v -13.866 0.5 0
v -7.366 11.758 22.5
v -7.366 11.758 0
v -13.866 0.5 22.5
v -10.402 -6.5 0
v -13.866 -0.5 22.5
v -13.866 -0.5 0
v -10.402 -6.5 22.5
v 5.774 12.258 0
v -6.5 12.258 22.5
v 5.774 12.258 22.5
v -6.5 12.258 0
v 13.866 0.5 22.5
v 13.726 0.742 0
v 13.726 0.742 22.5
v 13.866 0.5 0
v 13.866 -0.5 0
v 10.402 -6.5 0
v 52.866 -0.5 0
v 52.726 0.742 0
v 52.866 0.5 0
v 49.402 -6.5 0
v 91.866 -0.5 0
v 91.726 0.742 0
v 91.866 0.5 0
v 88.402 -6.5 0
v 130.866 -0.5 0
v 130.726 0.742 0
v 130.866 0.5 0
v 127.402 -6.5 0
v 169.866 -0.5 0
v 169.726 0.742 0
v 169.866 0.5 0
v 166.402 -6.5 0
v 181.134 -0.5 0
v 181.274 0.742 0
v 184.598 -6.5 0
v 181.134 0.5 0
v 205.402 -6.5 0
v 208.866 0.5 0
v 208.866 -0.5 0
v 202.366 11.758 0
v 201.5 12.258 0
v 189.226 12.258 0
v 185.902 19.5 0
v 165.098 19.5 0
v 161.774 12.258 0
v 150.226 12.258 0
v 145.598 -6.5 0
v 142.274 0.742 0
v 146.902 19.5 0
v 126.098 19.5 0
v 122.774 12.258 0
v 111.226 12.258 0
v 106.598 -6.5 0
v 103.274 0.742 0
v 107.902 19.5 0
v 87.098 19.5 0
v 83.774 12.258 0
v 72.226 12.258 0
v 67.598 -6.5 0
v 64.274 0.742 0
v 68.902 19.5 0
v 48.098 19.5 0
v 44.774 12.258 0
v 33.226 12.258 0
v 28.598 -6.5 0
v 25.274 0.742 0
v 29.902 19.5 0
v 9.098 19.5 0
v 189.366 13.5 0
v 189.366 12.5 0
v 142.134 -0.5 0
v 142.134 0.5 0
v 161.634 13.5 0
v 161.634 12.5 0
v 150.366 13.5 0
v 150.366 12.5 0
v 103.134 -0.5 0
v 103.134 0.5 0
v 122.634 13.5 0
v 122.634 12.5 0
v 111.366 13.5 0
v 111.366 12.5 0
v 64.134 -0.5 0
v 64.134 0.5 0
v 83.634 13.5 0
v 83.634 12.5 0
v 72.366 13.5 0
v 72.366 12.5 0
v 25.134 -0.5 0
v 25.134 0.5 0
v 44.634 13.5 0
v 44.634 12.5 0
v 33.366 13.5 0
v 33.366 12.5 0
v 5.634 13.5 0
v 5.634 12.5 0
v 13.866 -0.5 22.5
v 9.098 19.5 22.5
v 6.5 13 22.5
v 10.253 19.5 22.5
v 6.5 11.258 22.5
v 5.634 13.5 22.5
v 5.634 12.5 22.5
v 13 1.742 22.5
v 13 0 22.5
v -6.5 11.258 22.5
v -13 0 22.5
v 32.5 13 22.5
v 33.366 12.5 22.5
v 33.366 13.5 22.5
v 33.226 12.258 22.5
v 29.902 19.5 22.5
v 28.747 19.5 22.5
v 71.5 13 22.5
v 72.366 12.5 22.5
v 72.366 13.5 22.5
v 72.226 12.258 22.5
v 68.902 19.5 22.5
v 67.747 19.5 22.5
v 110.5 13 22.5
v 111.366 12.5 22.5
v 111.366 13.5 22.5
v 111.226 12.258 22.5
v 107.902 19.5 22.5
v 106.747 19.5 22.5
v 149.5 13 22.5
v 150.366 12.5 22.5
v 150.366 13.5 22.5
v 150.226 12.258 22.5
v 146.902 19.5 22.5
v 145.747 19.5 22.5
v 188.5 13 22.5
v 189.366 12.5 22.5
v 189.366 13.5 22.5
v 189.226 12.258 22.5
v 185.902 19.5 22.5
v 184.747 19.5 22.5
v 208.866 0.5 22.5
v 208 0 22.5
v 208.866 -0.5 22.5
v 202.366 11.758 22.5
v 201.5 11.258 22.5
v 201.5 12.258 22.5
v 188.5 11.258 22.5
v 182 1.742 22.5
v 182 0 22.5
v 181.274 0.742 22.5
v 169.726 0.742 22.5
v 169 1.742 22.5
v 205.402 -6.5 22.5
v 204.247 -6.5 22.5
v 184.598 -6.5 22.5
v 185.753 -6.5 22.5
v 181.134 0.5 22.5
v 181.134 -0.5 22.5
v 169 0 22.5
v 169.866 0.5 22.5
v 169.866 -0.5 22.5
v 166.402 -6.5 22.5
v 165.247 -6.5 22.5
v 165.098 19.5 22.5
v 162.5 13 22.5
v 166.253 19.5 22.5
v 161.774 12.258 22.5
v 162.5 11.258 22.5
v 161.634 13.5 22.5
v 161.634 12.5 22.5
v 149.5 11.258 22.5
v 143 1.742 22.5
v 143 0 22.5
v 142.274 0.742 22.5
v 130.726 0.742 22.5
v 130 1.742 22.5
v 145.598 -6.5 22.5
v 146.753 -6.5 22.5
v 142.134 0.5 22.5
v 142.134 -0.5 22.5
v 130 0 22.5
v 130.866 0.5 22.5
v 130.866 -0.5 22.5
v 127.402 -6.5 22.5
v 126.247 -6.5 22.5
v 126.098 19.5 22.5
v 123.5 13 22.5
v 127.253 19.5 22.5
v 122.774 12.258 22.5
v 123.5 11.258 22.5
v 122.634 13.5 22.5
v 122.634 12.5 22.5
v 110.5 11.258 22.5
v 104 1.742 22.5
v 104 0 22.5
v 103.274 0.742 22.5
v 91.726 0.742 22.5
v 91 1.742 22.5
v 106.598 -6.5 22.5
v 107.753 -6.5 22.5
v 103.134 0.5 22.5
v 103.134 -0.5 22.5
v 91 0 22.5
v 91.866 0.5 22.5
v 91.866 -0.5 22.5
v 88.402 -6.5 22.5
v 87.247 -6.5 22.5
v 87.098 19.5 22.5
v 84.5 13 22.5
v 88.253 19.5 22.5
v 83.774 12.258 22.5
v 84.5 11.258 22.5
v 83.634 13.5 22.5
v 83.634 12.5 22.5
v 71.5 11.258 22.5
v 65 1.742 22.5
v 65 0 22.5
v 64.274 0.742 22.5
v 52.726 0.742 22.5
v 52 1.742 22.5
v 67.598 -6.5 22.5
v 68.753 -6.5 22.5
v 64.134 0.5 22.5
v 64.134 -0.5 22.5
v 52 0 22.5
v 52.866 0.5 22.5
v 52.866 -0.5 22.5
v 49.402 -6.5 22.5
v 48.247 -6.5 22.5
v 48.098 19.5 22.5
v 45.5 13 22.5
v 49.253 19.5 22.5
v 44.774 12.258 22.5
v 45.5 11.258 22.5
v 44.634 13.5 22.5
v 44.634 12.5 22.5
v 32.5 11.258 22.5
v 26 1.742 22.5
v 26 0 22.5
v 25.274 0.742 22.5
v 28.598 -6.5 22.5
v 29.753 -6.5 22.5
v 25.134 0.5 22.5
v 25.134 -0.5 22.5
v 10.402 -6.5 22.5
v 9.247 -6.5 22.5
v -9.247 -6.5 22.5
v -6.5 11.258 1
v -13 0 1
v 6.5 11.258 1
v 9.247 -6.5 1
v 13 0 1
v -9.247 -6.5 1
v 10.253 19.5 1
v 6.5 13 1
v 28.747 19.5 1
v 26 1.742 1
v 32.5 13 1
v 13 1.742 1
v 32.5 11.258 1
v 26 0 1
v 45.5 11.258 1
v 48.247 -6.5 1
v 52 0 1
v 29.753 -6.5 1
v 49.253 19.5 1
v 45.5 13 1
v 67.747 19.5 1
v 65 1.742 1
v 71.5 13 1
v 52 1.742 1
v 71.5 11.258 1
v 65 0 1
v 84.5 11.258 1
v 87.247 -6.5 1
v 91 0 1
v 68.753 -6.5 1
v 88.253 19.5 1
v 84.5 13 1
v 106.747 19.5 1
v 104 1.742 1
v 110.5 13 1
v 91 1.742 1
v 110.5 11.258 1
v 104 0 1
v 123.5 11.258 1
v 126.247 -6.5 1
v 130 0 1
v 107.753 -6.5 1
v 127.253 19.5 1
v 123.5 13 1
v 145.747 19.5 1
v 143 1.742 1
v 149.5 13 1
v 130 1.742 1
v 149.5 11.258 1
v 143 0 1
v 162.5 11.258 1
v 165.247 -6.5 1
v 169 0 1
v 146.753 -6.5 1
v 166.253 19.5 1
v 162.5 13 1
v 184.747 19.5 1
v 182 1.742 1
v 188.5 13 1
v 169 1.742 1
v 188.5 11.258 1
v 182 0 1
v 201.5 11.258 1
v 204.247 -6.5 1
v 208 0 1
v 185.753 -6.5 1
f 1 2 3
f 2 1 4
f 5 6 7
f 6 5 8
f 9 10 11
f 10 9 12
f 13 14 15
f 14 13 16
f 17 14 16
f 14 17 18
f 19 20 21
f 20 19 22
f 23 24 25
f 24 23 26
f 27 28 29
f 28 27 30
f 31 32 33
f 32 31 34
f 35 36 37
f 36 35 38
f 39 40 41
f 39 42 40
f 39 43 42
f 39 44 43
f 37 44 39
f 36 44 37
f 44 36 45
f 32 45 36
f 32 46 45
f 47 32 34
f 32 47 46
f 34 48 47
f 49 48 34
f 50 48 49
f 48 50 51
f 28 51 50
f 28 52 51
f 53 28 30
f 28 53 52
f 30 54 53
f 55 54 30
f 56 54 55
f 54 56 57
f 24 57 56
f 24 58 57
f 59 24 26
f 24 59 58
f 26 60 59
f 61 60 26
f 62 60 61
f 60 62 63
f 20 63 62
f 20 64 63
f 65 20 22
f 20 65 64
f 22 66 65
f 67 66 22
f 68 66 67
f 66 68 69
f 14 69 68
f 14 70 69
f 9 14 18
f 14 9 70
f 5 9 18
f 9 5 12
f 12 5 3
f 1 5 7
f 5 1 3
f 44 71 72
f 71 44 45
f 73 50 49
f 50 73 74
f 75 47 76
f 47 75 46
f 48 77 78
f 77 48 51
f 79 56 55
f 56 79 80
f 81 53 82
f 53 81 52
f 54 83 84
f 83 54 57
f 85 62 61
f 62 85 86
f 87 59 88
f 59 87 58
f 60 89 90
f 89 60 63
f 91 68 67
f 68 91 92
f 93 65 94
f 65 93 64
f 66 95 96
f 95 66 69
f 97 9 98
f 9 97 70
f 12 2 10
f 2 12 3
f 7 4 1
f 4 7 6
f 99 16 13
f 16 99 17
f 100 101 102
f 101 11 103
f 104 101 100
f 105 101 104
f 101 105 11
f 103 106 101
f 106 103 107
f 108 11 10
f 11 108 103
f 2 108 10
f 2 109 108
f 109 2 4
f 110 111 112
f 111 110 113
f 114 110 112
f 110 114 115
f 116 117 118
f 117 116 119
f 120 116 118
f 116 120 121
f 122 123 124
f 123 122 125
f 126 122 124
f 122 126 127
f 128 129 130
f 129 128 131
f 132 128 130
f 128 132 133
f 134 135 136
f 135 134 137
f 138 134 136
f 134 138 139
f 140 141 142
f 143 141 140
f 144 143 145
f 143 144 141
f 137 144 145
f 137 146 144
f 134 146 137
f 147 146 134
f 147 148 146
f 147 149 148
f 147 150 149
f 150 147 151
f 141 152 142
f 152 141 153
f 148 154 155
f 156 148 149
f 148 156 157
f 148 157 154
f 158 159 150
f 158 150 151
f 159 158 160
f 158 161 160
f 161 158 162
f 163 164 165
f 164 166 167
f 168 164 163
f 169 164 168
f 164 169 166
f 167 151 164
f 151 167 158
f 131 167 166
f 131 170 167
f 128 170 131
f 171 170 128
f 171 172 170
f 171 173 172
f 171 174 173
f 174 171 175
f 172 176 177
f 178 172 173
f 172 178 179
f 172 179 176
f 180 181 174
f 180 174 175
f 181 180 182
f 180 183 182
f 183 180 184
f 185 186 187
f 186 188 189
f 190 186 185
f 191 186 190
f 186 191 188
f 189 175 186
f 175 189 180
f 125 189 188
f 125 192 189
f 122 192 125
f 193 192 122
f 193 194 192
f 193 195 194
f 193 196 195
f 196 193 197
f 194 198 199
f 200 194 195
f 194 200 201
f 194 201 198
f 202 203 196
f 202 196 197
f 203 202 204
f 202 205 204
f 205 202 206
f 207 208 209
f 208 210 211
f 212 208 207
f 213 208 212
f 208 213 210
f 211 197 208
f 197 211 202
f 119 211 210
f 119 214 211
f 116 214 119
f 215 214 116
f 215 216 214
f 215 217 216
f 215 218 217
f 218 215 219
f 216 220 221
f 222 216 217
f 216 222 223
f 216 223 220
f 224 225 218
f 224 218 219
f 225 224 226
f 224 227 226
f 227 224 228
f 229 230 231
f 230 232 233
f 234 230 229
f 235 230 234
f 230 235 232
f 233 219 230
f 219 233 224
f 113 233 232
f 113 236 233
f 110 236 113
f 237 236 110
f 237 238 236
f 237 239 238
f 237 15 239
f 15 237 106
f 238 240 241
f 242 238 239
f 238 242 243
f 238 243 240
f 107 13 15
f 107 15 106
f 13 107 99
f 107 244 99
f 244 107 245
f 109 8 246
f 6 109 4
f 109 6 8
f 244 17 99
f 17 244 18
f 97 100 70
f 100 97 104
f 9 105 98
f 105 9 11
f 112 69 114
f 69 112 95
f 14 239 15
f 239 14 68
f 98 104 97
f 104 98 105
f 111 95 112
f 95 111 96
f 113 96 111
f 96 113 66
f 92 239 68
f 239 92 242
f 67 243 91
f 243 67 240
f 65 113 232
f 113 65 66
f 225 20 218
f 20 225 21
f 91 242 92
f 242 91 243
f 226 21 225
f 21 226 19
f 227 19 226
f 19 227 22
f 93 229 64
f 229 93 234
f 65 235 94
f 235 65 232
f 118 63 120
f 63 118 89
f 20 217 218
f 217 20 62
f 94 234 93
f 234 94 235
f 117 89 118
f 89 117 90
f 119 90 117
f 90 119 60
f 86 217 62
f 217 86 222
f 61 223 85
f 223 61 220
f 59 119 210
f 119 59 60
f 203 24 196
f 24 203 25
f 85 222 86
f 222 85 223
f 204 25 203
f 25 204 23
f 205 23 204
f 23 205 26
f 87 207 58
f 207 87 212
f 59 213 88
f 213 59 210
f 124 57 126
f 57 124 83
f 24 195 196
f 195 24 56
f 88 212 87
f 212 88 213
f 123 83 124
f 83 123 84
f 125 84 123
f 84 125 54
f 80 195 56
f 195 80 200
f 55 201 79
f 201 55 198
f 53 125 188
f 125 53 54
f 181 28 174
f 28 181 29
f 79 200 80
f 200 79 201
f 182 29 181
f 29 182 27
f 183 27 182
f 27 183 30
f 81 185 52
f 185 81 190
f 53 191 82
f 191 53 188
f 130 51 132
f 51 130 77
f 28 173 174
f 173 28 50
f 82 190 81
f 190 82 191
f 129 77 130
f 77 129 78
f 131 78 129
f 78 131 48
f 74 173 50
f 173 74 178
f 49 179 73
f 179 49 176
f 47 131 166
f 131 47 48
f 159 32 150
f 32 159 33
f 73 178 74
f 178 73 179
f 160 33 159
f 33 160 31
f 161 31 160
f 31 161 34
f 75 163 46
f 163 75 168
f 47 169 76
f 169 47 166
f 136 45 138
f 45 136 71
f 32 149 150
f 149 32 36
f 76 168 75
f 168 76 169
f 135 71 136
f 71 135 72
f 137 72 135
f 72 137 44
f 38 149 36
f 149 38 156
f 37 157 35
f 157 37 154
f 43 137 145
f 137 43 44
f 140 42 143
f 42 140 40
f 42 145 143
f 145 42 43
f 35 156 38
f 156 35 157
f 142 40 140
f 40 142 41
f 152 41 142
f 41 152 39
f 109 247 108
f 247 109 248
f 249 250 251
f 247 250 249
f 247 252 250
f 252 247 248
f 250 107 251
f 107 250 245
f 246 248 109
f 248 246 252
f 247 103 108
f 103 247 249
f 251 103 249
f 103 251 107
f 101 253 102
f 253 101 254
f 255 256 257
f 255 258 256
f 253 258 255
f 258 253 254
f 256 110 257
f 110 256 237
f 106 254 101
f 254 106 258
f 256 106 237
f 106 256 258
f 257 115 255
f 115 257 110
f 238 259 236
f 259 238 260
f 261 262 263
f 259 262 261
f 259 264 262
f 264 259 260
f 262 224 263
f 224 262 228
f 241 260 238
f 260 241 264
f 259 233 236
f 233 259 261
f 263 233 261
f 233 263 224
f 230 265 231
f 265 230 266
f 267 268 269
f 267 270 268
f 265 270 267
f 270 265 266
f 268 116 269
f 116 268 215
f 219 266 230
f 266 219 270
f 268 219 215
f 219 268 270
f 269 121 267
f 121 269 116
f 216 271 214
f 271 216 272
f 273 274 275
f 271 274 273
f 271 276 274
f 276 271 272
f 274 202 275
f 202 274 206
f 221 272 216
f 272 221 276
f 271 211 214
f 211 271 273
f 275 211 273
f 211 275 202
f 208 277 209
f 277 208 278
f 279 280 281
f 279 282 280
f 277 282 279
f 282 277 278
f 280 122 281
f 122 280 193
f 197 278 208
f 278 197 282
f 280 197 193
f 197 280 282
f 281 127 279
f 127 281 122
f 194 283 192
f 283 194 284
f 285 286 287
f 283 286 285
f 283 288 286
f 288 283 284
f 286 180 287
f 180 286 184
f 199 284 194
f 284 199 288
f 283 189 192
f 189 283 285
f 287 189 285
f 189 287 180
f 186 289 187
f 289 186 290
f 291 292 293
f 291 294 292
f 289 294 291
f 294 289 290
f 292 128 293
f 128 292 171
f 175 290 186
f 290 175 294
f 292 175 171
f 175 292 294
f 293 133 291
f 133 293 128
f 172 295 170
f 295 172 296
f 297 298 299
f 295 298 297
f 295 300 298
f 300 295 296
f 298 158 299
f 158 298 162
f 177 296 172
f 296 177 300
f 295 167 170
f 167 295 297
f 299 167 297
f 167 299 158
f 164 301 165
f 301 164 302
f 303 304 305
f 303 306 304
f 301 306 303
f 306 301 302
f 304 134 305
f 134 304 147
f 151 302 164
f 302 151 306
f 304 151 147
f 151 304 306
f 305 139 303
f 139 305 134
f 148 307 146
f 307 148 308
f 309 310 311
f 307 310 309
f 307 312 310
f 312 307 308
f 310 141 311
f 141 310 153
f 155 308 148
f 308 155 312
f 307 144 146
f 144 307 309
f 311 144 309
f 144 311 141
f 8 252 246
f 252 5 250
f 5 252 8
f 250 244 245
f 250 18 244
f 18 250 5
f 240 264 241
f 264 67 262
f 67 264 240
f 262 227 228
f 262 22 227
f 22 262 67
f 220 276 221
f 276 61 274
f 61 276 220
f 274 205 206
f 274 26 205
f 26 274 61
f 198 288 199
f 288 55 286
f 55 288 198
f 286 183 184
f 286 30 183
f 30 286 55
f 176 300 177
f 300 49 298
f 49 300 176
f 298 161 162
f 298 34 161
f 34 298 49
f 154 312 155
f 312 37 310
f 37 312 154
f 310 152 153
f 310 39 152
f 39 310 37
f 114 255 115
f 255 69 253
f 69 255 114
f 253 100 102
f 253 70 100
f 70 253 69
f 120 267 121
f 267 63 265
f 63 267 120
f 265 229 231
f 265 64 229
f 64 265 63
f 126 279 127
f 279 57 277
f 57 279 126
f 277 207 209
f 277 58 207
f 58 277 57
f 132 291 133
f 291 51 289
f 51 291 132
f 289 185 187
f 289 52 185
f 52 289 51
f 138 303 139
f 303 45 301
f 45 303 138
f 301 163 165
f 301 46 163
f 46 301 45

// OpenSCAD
slots = 11;
disks_per_slot = 18;
disk_radius = 13;
disk_height = 1.25;

module honeycomb(slot_count, disk_count, offset=0) {
  for (i = [0:slot_count - 1]) {
    translate([i * 1.5 * disk_radius, (i % 2) * disk_radius, 0]) 
      linear_extrude(height = disk_count * disk_height)
        offset(offset)
        circle($fn = 6, r = disk_radius);
    
  }
}

difference () {
  // solid honeycomb
  honeycomb(slots, disks_per_slot, 1);
  
  // inner honeycomb to hollow out
  translate([0, 0, 1]) 
    honeycomb(slots, disks_per_slot, 0);
  
  // cubes to open up the sides
  translate([-disk_radius, -disk_radius - disk_radius/2, -3])
    cube([disk_radius * slots * 2, disk_radius, disks_per_slot * disk_height * 2]);
  
  translate([-disk_radius, disk_radius * 1.5, -3])
    cube([disk_radius * slots * 2, disk_radius, disks_per_slot * disk_height * 2]);
}
